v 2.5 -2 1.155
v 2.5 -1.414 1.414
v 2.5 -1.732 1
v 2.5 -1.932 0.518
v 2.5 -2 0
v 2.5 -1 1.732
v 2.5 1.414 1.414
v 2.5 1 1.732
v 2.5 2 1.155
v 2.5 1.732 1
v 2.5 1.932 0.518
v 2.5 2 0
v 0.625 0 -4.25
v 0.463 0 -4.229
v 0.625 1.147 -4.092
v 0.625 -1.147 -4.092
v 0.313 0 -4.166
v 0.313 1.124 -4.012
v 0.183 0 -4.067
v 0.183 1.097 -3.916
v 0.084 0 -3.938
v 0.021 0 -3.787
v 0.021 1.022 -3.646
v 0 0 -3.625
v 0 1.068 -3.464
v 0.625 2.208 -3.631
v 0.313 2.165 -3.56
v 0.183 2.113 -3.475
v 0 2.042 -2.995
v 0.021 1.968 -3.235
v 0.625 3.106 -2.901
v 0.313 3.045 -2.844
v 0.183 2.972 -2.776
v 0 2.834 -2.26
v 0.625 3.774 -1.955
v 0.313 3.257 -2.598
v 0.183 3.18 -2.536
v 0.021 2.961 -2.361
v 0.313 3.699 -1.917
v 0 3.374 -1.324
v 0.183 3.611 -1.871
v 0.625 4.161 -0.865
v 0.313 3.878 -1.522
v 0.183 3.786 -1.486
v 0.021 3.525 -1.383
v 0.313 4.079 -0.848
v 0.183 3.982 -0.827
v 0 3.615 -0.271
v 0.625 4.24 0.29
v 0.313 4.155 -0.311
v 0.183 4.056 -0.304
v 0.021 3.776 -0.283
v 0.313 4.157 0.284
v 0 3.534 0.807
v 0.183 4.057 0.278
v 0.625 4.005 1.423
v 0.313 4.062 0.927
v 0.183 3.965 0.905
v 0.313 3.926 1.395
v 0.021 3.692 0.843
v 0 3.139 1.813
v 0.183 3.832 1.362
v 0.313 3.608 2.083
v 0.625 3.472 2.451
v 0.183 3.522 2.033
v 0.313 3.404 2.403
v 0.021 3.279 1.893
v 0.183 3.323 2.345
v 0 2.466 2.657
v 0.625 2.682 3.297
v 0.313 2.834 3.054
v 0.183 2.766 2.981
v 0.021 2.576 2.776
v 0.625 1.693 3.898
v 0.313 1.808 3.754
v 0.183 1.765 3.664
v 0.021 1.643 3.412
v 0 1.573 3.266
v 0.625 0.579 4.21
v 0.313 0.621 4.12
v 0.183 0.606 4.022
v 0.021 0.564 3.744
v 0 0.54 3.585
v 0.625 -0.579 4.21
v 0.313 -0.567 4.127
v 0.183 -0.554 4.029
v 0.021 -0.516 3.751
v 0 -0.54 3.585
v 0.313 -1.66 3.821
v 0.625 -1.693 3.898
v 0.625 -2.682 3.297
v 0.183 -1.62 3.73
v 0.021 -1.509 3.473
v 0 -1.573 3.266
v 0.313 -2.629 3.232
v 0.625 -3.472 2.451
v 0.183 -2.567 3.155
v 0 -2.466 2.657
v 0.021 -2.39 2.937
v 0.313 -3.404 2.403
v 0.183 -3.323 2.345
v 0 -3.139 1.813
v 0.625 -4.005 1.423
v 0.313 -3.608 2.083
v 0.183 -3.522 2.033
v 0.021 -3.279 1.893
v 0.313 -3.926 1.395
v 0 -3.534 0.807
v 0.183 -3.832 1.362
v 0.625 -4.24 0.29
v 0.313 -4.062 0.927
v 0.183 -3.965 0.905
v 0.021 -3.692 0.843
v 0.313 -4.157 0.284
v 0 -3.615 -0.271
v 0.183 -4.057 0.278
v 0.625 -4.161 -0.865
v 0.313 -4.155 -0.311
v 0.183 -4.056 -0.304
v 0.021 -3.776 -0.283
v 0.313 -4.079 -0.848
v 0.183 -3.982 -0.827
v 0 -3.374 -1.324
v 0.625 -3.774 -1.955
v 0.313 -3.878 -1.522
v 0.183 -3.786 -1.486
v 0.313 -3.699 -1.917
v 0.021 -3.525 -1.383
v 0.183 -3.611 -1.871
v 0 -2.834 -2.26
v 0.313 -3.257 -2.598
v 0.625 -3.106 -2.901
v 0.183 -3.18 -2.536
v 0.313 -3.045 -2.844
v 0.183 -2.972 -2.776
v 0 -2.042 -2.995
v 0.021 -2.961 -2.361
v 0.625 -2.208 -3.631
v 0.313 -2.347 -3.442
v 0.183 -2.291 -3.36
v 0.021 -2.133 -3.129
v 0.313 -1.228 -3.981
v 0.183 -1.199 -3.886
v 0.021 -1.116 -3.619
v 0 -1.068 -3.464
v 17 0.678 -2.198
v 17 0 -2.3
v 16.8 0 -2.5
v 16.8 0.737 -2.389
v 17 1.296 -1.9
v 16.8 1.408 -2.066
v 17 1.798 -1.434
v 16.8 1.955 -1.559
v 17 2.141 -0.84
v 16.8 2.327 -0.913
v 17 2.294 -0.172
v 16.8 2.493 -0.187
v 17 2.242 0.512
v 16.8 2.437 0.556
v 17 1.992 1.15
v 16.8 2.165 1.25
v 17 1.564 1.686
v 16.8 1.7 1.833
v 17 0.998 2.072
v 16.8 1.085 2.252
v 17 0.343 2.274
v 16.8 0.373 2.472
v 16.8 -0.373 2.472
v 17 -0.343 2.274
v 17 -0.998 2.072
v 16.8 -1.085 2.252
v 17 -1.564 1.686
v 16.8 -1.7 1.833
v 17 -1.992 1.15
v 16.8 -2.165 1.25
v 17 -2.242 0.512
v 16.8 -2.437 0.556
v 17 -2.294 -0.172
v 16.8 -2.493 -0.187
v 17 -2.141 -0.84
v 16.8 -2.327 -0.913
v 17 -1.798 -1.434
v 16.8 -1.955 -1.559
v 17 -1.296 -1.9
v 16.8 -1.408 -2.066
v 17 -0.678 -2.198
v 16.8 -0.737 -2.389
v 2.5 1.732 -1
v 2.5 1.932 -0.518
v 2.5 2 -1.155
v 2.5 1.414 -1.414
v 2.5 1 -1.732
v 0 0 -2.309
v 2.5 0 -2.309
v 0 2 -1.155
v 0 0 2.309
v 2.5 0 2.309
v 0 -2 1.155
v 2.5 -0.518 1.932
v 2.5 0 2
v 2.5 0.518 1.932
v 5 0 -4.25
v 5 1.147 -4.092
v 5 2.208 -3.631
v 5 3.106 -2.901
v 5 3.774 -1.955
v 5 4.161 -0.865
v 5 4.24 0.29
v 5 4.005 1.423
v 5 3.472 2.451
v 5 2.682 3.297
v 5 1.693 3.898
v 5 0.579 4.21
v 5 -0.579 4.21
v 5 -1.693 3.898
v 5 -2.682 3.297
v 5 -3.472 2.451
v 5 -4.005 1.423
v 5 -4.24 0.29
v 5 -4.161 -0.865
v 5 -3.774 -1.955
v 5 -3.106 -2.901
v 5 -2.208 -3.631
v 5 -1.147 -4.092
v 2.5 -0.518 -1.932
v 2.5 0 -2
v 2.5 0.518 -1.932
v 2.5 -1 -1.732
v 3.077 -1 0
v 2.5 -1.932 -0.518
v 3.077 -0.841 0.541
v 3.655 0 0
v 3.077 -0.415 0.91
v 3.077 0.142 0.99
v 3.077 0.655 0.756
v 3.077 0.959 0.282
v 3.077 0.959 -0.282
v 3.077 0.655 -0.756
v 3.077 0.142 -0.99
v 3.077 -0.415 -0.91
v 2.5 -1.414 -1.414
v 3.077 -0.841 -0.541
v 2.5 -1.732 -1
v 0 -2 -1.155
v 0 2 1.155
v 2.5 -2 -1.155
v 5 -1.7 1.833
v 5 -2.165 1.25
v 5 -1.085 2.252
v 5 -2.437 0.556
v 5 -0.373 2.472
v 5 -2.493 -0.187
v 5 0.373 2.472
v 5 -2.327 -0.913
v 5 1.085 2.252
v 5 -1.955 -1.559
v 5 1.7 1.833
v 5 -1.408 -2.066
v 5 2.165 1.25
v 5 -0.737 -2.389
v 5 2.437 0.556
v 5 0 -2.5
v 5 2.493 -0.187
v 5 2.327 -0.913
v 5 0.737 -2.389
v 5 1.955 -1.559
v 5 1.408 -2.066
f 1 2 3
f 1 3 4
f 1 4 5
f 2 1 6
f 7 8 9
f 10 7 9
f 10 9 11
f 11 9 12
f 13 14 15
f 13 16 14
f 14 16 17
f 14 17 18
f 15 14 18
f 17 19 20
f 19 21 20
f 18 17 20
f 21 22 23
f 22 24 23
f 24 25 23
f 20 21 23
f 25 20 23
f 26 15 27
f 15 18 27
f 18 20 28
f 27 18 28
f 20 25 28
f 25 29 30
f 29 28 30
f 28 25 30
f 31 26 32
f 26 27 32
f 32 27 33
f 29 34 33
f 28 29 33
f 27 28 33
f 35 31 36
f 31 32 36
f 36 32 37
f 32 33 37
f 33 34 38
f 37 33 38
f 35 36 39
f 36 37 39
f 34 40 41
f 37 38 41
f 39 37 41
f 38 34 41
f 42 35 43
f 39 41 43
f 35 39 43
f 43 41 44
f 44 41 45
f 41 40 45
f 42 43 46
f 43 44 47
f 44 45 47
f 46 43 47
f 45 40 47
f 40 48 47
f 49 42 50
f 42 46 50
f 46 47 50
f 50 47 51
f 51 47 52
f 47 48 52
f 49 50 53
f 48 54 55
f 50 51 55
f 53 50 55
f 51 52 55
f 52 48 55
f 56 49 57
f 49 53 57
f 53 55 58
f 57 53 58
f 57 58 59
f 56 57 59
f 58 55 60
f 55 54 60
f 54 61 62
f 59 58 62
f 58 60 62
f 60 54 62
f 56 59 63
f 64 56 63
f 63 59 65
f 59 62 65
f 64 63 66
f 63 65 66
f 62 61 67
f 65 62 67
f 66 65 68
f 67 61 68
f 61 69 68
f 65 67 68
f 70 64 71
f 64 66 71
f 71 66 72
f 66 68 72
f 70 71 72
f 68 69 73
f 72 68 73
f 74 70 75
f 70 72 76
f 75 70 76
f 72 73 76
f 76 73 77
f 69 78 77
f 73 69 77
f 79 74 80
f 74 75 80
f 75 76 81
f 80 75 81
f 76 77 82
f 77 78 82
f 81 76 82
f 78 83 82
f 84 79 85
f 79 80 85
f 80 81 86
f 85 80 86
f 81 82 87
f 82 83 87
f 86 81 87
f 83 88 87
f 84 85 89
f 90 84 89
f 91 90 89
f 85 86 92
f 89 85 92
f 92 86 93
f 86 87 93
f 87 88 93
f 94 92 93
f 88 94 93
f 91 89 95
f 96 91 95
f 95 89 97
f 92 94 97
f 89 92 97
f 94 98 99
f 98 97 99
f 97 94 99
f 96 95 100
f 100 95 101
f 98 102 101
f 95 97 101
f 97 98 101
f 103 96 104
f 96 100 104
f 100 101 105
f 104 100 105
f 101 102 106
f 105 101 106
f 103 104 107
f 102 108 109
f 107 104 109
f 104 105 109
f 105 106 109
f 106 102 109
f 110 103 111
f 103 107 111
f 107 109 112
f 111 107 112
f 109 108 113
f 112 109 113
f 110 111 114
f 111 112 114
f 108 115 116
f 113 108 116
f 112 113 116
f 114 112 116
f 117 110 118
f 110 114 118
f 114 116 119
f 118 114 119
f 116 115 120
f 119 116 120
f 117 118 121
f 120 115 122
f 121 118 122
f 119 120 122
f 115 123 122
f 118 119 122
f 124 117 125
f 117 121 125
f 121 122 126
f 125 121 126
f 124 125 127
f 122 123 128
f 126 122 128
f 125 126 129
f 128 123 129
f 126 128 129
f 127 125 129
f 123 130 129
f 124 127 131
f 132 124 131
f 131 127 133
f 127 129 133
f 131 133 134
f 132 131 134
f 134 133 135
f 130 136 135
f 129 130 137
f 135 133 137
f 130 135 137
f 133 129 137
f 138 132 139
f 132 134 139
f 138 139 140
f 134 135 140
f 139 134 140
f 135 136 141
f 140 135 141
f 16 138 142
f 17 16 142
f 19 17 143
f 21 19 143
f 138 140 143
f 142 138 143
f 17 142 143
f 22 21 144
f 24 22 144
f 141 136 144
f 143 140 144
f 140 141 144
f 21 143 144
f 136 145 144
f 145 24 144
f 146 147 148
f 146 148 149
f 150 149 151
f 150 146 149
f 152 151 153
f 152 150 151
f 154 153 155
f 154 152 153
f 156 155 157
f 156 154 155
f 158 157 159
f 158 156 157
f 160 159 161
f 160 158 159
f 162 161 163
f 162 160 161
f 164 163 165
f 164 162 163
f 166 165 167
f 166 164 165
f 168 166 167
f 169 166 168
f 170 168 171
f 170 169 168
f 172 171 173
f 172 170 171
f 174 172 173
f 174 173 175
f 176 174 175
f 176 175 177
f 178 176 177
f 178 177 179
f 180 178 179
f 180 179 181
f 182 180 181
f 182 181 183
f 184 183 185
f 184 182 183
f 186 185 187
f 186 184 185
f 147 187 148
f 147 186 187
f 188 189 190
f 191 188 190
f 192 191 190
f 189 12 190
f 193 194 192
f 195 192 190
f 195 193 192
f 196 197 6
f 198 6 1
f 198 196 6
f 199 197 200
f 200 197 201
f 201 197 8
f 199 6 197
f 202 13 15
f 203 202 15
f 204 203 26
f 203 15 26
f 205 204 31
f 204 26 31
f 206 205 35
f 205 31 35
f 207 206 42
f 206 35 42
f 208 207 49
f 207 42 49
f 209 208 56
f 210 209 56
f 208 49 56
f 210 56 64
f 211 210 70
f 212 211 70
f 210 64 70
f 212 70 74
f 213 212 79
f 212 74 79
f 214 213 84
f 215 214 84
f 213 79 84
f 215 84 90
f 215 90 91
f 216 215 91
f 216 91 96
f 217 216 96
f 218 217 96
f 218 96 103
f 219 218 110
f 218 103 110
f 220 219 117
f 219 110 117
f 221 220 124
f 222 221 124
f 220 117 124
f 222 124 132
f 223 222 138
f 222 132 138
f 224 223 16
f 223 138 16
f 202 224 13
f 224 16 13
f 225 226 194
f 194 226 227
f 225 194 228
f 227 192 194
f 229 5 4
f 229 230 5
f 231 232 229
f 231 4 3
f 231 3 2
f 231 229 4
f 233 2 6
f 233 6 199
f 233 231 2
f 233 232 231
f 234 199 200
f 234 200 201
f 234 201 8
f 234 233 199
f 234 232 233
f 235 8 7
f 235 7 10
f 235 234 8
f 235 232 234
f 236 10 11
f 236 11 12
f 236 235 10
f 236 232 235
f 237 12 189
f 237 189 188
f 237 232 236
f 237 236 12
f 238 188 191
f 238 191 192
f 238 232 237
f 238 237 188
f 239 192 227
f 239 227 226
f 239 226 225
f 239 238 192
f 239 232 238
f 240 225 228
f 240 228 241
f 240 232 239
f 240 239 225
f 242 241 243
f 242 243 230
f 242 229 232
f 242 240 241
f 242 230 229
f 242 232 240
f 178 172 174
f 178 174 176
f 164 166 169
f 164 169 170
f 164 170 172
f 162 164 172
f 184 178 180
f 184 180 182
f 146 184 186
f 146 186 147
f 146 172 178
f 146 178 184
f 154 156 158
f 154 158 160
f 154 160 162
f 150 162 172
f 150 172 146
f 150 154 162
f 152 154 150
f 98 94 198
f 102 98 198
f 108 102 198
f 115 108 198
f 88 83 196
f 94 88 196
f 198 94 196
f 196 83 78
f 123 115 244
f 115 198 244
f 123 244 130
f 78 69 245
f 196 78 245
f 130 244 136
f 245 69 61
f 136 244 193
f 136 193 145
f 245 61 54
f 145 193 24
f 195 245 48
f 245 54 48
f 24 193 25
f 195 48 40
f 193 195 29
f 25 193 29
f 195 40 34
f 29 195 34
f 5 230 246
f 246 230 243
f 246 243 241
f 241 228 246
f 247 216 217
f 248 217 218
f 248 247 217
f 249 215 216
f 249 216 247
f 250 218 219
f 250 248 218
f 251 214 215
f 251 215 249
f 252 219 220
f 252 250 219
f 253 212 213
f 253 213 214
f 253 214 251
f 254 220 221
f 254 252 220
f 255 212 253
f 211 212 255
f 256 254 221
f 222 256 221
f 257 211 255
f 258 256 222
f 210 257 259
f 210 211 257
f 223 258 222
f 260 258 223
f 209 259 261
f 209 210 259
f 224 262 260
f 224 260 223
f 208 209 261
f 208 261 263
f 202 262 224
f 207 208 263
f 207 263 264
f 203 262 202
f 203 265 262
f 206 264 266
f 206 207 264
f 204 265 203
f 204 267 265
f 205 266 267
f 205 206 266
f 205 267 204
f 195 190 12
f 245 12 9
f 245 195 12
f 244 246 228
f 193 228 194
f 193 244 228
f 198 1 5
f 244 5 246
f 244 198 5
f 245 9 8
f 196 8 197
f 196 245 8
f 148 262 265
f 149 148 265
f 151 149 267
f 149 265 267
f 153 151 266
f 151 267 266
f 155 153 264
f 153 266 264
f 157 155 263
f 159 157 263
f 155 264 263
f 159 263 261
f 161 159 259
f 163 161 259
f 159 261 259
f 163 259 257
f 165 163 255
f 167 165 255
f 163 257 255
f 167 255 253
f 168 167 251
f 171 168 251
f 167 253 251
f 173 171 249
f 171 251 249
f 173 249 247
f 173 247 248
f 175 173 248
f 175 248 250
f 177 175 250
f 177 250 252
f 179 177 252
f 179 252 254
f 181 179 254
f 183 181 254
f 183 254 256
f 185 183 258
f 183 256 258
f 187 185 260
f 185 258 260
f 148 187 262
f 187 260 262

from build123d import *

# Parameters (mm, degrees)
SKETCH1_R           = 4.25
BASEHEAD_DEPTH      = 5
SKETCH2_R           = 2.5
BASEBODY_DEPTH      = 12
HEXAGONSOCKET_DEPTH = 2.5
TOPFILLET_R         = 0.625
CHAMFER1_SIZE       = 0.2


with BuildPart() as part:
    # Sketch1 → BaseHead (new body)
    with BuildSketch(Plane(origin=(0, 0, 0), x_dir=(0, 0, -1), z_dir=(1, 0, 0))):
        Circle(SKETCH1_R)
    extrude(amount=BASEHEAD_DEPTH)

    # Sketch2 → BaseBody (add)
    with BuildSketch(Plane(origin=(5, 0, 0), x_dir=(0, 0, -1), z_dir=(1, 0, 0))):
        Circle(SKETCH2_R)
    extrude(amount=BASEBODY_DEPTH)

    # Sketch3 → HexagonSocket (cut)
    with BuildSketch(Plane(origin=(0, 0, 0), x_dir=(0, 0, -1), z_dir=(1, 0, 0))):
        Polygon((2.309401077, 0), (1.154700538, 2), (-1.154700538, 2), (-2.309401077, 0), (-1.154700538, -2), (1.154700538, -2), align=None)
    extrude(amount=HEXAGONSOCKET_DEPTH, mode=Mode.SUBTRACT)

    # Sketch4 → Cut-Revolve1 (revolve, cut)
    with BuildSketch(Plane(origin=(-4.19613823, 0.75, 0), x_dir=(-1, 0, 0), z_dir=(0, 0, 1))):
        Polygon((-6.69613823, 2.75), (-7.850838768, 0.75), (-6.69613823, 0.75), align=None)
    revolve(axis=Axis((0.838992387, 0, 0), (-1, 0, 0)), mode=Mode.SUBTRACT)

    # TopFillet
    topfillet_edges = [part.edges().sort_by_distance(p)[0] for p in [
        (0, 0, 4.25),
    ]]
    fillet(topfillet_edges, radius=TOPFILLET_R)

    # Chamfer1
    chamfer1_edges = [part.edges().sort_by_distance(p)[0] for p in [
        (17, 0, 2.5),
    ]]
    chamfer(chamfer1_edges, length=CHAMFER1_SIZE)


solid = part.part
